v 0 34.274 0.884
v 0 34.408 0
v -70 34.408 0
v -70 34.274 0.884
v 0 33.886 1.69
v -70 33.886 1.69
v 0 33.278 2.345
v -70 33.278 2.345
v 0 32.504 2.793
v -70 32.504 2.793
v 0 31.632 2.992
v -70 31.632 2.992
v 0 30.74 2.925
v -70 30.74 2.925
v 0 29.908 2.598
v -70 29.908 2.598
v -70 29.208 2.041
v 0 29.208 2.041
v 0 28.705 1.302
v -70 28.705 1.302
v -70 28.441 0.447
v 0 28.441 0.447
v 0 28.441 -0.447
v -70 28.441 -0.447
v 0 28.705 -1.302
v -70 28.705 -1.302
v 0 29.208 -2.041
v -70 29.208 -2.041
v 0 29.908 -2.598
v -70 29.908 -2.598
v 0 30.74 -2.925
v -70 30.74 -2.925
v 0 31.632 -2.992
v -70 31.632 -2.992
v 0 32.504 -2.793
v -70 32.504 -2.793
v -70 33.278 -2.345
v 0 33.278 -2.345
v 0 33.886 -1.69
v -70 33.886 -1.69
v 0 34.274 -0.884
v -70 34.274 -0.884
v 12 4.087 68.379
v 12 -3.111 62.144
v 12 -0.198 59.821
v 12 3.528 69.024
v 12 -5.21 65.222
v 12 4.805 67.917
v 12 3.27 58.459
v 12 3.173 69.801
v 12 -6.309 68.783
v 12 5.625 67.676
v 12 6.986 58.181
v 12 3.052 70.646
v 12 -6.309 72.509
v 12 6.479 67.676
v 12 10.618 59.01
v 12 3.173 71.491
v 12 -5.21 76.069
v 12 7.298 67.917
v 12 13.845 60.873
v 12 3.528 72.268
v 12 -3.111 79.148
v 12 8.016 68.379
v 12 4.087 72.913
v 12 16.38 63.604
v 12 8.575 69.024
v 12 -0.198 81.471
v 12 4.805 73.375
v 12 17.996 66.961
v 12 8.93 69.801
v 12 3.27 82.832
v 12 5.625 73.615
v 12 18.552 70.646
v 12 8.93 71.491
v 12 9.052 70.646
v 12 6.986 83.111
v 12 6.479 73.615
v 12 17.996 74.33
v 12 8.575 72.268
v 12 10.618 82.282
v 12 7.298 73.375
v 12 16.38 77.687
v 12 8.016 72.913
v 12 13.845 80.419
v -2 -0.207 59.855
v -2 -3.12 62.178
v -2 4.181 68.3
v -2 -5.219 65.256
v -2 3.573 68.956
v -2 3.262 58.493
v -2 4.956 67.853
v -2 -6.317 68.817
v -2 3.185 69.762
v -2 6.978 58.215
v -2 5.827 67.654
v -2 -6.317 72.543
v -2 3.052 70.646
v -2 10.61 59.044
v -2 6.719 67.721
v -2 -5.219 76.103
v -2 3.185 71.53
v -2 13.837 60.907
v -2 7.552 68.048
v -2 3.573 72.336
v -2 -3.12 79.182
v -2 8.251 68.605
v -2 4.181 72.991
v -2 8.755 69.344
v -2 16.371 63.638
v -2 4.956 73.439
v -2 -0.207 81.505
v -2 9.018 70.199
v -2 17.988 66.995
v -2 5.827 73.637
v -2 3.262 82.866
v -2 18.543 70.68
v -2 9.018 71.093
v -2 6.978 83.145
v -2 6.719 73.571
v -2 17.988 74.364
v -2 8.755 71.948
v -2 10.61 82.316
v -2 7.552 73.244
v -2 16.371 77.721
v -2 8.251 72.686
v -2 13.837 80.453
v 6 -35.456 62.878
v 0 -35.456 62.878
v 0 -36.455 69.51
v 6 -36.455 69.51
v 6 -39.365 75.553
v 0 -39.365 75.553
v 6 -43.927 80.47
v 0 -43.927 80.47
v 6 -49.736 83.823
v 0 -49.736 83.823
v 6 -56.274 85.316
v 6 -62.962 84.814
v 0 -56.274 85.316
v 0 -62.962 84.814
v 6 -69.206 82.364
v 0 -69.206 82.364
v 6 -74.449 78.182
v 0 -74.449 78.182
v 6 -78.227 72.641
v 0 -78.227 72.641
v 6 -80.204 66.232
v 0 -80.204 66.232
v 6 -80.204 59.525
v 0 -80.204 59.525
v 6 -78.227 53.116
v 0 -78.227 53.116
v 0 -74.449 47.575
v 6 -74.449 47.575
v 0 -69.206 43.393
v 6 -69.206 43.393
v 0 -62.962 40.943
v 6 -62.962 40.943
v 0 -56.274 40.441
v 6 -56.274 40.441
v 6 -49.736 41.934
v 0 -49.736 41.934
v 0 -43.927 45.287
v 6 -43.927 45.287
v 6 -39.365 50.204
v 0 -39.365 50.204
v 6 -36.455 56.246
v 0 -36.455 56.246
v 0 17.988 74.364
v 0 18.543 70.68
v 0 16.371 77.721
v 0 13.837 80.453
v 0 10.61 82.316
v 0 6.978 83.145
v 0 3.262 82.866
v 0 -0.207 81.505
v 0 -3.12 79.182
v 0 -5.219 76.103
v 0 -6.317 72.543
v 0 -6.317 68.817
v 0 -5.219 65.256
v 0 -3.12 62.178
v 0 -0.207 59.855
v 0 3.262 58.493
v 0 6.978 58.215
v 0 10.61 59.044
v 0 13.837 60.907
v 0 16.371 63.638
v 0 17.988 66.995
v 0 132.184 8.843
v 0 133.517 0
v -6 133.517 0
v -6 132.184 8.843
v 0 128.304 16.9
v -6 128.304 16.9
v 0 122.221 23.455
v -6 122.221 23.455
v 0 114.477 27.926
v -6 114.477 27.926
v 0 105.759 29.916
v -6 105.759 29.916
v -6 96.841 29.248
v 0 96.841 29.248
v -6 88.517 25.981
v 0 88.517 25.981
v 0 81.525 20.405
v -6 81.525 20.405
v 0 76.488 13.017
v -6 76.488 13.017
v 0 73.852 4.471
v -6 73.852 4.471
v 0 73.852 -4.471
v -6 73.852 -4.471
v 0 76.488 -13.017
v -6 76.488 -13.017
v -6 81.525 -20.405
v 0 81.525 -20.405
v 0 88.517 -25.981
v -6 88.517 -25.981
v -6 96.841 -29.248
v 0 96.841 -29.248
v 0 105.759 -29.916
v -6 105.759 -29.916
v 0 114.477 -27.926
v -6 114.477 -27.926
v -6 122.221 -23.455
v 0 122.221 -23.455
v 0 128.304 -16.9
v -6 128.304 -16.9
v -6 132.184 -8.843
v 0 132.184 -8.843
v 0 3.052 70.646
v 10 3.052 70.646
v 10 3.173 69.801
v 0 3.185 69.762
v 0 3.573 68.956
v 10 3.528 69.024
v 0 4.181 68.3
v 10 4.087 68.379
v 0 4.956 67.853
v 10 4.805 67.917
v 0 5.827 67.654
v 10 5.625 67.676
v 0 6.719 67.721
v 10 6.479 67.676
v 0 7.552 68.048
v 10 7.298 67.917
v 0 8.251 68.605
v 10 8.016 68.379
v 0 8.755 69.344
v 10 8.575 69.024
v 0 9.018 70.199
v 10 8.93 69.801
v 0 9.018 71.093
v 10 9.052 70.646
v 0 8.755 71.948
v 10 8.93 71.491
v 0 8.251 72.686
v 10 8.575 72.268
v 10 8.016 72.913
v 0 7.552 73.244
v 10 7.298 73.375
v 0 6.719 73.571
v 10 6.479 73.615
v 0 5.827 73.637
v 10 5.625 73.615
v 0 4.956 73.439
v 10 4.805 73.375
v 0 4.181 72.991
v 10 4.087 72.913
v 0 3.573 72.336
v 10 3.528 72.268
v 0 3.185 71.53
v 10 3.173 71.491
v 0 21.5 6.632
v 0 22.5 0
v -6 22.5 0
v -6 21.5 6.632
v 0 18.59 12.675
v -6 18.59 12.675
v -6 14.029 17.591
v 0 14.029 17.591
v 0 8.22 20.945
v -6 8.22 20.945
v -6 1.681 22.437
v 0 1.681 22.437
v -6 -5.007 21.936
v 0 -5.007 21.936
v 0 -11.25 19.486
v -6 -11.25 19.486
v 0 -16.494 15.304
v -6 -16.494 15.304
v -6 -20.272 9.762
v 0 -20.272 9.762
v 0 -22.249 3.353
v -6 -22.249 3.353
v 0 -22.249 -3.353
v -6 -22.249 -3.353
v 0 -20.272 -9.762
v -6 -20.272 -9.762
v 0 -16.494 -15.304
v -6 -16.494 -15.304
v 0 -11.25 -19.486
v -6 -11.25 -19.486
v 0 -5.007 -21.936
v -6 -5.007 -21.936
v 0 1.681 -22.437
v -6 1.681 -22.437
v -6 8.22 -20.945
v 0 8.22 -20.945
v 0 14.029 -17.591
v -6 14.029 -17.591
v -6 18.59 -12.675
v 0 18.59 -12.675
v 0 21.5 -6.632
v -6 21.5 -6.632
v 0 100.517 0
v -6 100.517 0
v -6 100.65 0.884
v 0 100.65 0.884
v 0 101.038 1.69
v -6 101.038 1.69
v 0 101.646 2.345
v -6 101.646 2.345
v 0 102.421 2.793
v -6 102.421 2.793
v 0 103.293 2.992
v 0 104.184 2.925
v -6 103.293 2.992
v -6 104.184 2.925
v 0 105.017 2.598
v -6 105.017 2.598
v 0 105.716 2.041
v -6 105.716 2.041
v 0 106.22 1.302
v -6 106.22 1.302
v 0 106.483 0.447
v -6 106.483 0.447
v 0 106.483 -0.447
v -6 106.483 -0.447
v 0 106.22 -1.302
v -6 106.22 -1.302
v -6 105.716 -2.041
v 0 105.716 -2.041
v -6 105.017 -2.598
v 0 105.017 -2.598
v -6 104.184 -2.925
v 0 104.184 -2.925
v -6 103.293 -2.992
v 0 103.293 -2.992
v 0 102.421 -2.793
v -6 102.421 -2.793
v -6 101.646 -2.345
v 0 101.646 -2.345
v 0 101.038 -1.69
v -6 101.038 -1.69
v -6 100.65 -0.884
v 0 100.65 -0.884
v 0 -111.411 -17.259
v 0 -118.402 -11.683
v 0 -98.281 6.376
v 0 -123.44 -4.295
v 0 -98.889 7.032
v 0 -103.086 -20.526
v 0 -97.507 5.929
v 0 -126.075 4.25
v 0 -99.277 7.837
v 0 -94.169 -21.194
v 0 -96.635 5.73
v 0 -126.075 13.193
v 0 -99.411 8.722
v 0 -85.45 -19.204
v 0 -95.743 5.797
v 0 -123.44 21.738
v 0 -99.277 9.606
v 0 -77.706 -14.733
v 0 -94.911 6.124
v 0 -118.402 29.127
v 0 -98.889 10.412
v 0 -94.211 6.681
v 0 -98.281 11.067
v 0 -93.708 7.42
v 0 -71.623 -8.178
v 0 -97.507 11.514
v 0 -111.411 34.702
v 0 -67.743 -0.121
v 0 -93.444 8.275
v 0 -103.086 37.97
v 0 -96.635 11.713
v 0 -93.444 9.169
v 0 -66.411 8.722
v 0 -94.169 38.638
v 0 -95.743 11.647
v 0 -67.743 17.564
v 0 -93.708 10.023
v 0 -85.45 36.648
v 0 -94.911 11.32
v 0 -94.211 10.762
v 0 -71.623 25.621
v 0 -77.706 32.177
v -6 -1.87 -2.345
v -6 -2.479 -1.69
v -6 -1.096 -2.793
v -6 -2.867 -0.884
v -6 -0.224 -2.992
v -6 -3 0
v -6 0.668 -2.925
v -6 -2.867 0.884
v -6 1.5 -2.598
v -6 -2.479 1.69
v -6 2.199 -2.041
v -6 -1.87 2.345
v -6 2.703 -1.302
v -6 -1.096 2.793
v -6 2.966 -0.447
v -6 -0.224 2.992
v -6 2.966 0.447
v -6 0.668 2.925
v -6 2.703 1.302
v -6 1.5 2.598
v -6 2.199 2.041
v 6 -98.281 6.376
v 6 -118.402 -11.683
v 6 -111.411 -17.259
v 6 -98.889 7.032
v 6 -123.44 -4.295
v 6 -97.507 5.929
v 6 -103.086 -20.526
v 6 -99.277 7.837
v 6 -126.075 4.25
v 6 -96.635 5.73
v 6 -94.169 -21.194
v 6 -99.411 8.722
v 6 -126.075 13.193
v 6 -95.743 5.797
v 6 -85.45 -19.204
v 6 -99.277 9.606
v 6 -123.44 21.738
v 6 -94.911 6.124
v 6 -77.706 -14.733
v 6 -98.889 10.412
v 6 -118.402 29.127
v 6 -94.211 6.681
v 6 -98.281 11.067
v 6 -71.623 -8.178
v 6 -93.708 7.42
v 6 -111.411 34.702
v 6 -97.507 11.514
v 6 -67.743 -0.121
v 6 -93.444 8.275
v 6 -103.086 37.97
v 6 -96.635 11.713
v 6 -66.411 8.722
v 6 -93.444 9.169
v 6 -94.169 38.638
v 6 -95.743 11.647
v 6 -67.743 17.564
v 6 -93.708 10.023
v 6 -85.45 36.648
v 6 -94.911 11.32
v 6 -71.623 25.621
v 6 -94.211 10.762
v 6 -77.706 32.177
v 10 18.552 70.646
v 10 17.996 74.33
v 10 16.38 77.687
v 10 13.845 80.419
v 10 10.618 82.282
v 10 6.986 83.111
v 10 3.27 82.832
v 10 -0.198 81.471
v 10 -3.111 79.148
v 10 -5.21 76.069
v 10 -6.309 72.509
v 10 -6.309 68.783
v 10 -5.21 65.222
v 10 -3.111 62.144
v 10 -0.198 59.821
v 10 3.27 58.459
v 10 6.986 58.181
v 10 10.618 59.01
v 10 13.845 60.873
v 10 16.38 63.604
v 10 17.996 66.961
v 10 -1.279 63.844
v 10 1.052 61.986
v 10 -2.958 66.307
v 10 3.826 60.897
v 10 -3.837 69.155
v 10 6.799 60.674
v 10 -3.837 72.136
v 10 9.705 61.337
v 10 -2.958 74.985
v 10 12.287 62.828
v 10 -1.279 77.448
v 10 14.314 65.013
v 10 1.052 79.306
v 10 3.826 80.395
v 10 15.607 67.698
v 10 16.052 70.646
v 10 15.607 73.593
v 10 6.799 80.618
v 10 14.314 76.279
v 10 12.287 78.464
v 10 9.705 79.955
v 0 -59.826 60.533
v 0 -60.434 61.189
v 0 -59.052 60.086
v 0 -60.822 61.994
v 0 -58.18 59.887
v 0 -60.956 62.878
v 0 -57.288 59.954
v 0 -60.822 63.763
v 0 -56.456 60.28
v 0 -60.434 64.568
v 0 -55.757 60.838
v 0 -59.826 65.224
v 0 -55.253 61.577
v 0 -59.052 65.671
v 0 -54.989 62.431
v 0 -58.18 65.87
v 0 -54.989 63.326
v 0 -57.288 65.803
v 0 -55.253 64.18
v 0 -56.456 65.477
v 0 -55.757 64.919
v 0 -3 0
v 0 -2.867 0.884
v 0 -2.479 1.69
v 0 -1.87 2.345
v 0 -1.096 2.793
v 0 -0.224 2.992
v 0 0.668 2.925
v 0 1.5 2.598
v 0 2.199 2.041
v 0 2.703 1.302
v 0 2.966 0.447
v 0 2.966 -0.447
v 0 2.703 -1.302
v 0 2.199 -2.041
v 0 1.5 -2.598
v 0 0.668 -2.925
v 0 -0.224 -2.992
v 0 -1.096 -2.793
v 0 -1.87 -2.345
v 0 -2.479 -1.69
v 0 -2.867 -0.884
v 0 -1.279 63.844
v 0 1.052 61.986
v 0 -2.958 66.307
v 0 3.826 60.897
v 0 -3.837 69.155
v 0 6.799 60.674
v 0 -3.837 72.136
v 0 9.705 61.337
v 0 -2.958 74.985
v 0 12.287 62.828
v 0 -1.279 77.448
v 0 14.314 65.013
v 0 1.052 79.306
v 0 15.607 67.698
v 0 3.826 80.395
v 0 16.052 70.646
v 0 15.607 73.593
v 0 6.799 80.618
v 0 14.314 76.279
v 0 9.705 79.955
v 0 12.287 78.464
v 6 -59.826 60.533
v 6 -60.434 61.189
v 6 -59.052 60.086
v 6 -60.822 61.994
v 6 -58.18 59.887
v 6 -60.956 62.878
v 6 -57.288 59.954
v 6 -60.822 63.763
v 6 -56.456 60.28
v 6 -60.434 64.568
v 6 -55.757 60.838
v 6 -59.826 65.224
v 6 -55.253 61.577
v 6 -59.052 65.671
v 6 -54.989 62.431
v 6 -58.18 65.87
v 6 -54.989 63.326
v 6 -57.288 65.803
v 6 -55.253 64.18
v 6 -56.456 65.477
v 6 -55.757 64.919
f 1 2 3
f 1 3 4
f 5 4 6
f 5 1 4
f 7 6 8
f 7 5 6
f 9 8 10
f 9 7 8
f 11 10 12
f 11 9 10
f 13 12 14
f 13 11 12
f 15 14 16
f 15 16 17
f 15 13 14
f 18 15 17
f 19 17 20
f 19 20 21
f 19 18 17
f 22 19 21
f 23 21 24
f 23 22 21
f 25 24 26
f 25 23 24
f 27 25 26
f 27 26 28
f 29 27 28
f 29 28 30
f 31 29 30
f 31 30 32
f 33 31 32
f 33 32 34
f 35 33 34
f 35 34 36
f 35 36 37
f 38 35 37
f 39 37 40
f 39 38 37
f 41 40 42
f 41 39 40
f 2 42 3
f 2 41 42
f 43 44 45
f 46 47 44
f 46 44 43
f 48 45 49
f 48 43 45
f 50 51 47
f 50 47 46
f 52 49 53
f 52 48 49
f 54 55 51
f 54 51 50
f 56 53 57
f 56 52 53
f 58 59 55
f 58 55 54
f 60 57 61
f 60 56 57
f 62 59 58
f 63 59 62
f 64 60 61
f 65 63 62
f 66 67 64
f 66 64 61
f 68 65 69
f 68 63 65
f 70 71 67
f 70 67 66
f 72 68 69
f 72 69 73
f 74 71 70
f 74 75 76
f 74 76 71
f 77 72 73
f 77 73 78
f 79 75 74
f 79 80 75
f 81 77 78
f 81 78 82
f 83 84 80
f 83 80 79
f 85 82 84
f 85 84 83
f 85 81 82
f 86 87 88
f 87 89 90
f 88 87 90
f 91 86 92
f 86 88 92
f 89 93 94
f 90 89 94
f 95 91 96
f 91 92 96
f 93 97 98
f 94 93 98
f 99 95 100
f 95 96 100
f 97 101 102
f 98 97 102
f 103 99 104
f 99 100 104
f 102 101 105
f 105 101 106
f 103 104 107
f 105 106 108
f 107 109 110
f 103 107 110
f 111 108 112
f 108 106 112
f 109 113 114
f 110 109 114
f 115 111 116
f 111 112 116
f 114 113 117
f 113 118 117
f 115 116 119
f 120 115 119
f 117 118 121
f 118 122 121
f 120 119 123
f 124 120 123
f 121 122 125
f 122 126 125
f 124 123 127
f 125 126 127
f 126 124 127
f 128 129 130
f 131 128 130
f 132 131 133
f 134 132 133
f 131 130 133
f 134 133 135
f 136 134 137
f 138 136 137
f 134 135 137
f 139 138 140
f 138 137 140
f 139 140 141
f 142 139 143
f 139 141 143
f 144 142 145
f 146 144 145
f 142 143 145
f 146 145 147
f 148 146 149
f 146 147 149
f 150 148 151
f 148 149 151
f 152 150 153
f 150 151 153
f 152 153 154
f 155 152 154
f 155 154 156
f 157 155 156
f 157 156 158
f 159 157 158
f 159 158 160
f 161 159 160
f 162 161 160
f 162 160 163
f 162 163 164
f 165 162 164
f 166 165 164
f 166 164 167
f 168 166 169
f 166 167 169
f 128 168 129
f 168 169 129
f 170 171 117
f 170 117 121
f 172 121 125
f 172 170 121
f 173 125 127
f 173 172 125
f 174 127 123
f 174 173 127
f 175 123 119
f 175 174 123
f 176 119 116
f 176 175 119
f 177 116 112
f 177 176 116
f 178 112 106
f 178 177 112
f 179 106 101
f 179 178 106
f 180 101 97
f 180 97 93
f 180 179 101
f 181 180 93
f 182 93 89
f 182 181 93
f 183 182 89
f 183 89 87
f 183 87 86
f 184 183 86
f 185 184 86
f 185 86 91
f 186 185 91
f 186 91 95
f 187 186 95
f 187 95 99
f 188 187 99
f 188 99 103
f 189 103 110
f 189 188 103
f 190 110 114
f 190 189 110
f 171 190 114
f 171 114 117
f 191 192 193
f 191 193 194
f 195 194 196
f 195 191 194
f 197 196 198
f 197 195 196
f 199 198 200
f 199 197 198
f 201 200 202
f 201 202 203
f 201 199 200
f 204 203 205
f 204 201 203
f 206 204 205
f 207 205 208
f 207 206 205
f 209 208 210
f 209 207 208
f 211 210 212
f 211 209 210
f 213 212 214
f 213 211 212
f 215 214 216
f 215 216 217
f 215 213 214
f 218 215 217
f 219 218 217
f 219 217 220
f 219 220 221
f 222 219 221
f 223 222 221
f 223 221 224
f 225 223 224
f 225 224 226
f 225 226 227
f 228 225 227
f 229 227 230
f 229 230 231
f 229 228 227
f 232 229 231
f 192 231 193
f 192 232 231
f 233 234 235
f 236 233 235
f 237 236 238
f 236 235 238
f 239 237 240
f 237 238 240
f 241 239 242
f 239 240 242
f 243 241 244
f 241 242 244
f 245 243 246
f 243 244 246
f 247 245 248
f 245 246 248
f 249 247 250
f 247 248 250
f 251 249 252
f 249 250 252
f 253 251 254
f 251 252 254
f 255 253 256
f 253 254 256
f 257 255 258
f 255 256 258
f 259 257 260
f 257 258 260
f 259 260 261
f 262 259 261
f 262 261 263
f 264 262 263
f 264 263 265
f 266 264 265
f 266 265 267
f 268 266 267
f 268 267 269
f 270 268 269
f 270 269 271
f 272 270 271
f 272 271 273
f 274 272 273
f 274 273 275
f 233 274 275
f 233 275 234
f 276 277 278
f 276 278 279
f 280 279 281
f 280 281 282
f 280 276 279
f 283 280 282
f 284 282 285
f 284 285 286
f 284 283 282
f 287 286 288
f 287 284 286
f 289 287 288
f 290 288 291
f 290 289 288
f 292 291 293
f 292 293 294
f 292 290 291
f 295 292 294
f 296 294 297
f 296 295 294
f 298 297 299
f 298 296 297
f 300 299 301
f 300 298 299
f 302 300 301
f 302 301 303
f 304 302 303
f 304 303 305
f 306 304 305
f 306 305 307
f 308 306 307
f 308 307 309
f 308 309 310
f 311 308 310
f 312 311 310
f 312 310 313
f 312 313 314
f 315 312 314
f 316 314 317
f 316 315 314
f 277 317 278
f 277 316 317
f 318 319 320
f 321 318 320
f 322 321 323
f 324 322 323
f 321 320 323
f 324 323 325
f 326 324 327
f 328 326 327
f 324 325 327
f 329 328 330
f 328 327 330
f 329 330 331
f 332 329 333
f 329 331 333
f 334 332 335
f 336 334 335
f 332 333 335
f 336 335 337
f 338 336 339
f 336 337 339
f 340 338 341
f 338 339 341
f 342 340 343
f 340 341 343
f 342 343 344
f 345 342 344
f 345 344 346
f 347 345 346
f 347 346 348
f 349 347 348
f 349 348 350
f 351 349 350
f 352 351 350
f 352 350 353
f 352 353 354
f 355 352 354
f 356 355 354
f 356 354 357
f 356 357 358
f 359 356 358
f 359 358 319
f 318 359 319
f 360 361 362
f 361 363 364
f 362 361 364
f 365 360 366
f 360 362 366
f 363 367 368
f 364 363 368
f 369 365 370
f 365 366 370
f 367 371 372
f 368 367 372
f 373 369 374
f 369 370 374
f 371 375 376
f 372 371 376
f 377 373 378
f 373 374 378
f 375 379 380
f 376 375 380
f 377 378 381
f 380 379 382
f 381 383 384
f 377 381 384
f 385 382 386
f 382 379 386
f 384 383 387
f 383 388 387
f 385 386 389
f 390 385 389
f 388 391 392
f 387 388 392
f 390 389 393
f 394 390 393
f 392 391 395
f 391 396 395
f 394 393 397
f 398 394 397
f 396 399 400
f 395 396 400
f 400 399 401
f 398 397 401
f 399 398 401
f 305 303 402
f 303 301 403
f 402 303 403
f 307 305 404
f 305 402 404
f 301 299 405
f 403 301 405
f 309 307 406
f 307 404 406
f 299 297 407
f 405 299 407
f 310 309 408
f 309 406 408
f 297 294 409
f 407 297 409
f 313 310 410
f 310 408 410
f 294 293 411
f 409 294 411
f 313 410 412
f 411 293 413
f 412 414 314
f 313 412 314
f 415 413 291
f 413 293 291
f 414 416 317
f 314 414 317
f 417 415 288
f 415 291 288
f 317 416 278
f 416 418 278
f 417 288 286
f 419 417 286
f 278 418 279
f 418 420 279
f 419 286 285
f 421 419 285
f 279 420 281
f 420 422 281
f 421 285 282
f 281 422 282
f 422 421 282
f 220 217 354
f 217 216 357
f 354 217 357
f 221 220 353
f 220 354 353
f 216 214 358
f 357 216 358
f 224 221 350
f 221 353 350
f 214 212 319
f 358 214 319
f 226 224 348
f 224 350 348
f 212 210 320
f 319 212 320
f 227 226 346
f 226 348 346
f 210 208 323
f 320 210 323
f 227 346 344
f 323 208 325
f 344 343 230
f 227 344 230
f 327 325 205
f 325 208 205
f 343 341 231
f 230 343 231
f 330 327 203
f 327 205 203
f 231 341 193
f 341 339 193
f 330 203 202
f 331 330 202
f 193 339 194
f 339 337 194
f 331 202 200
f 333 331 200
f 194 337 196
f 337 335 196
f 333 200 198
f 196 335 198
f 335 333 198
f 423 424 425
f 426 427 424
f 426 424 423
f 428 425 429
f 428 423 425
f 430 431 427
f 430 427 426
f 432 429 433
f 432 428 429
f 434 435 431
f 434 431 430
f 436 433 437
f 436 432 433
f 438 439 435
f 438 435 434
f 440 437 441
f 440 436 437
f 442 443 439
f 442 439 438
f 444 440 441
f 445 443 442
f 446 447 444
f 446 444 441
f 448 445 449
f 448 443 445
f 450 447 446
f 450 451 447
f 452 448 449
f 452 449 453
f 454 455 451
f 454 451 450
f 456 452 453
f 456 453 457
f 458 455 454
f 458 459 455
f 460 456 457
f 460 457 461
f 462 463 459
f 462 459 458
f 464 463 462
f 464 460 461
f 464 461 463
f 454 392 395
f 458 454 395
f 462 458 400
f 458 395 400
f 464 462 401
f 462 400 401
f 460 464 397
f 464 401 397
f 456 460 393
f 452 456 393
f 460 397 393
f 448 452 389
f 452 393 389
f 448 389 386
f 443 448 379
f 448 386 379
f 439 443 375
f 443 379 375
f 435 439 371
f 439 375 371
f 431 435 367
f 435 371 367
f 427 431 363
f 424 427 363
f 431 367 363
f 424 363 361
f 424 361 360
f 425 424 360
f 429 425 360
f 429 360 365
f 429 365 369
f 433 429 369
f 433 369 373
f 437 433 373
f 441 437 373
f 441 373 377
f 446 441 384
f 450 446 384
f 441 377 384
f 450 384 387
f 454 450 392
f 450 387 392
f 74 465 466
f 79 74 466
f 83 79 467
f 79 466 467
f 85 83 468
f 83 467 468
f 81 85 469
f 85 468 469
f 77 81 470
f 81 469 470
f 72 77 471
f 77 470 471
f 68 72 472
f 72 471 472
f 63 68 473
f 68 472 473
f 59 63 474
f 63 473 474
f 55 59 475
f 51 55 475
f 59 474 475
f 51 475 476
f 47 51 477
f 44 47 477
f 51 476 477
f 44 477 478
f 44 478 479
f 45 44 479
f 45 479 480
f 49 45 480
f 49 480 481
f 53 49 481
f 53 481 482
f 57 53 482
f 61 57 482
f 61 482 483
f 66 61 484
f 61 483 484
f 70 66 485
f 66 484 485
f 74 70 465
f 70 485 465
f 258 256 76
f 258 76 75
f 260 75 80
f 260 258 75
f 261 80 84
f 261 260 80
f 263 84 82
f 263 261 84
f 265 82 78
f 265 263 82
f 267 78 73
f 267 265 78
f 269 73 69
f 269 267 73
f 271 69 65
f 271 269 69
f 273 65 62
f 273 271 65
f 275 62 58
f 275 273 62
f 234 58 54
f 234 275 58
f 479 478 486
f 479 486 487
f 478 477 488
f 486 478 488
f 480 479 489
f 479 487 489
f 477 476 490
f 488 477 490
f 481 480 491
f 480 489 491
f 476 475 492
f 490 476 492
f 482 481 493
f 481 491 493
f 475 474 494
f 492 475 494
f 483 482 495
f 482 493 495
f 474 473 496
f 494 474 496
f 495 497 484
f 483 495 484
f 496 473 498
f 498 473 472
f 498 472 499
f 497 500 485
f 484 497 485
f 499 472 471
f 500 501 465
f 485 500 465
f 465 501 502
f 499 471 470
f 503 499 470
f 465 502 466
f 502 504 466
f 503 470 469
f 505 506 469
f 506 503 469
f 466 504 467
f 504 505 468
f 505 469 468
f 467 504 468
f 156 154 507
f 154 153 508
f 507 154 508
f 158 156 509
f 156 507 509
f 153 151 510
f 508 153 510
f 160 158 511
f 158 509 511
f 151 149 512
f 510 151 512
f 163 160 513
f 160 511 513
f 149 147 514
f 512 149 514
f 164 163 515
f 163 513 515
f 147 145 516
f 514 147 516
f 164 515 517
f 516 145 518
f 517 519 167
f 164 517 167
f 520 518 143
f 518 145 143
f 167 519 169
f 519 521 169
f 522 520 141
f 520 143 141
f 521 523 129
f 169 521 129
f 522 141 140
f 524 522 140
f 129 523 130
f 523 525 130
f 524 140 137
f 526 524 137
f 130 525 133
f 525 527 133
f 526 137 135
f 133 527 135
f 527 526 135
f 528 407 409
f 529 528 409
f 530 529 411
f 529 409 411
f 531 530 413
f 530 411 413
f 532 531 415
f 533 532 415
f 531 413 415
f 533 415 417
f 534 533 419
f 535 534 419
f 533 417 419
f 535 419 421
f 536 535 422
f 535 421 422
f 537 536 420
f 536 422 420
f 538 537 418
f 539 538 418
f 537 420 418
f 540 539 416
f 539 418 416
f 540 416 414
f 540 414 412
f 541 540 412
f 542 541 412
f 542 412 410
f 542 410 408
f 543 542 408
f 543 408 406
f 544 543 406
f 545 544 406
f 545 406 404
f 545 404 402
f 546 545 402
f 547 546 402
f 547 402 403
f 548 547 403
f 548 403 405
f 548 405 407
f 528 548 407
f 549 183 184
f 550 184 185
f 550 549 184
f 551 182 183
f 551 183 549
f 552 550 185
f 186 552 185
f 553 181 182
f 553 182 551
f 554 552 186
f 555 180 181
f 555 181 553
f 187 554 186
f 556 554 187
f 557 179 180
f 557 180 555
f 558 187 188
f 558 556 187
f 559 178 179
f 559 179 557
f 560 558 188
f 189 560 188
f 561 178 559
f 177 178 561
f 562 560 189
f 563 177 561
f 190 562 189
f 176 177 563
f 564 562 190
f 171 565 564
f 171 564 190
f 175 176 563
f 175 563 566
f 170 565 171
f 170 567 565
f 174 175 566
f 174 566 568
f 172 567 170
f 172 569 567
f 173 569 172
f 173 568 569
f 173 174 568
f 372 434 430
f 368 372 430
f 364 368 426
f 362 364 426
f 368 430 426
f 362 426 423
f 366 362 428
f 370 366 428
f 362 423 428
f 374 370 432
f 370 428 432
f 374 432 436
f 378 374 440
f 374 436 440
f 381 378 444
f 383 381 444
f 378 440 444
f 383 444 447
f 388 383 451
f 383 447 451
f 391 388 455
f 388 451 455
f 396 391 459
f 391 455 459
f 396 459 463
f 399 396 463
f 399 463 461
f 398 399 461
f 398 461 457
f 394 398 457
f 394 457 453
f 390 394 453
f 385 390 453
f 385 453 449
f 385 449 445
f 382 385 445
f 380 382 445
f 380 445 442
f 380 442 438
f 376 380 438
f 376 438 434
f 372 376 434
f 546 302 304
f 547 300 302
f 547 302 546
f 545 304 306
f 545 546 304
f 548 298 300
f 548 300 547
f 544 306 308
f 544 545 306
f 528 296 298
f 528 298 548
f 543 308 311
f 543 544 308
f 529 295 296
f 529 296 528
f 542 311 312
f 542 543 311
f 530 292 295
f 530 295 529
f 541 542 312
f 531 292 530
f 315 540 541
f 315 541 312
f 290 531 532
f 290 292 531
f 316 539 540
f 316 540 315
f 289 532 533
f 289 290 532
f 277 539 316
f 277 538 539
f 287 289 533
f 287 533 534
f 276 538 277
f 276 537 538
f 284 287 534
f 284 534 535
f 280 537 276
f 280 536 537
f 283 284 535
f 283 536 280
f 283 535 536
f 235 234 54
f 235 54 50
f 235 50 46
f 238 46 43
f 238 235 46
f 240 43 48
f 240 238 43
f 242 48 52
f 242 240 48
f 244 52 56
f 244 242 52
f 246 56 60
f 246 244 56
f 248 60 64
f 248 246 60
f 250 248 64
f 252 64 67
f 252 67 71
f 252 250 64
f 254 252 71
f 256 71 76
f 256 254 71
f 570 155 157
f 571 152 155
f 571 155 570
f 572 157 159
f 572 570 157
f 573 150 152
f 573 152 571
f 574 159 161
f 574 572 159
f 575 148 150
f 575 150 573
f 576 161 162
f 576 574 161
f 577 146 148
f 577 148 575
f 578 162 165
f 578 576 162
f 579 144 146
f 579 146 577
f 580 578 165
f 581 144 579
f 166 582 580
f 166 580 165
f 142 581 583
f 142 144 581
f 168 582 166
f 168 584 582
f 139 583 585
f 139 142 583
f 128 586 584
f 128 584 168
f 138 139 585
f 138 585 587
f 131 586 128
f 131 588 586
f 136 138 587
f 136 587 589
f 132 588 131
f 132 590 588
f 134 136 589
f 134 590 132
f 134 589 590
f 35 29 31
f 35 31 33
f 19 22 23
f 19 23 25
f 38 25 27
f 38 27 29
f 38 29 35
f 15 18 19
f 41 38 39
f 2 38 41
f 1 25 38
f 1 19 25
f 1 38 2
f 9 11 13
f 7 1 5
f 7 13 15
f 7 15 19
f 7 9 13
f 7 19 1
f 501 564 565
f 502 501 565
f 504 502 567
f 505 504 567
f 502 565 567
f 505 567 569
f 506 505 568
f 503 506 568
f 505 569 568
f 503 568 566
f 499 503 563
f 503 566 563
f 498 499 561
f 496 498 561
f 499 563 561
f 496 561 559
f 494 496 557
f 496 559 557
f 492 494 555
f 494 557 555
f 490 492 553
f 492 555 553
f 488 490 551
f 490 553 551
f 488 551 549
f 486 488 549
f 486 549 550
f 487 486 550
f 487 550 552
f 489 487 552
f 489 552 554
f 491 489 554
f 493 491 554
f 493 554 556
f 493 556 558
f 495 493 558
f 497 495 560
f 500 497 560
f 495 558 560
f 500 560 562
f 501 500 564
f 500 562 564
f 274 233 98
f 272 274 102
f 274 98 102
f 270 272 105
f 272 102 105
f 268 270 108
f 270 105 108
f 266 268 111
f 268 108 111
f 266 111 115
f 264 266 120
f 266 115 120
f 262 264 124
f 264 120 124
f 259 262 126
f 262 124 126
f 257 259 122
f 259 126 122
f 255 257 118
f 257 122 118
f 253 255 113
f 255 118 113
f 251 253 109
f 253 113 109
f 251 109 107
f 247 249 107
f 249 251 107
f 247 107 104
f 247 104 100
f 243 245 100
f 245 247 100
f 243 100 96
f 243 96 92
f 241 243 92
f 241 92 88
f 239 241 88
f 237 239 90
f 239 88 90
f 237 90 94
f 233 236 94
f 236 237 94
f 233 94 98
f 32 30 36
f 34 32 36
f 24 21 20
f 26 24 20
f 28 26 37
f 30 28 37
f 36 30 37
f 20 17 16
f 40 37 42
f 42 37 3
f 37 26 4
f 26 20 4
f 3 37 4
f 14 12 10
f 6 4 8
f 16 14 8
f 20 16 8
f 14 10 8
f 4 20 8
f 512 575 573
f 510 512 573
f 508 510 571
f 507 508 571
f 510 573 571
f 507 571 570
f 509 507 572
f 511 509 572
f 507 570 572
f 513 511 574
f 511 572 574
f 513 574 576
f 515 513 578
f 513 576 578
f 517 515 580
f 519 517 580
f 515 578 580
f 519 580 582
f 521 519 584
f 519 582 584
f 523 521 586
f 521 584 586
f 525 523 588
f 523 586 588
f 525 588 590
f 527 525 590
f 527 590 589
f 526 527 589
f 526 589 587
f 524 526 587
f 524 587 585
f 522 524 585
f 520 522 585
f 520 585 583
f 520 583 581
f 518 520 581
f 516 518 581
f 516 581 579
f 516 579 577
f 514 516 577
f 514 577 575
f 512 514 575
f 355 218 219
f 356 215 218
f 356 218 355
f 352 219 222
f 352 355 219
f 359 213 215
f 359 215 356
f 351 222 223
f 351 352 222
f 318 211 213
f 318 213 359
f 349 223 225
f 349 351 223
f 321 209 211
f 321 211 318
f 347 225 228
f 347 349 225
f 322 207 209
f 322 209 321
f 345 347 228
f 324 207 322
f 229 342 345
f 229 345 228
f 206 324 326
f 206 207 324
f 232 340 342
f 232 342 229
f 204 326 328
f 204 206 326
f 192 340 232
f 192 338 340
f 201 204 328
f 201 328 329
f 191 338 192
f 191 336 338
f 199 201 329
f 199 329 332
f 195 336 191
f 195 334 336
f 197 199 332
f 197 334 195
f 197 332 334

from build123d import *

# Parameters (mm, degrees)
F0_R      = 22.5
F1_DEPTH  = 6
F2_D      = 6
F3_R      = 30
F4_DEPTH  = 6
F5_D      = 6
F6_R      = 3
F7_DEPTH  = 70
F8_R      = 30
F9_DEPTH  = 6
F10_D     = 6
F11_R     = 22.5
F12_DEPTH = 6
F13_D     = 6
F14_R     = 10
F15_DEPTH = 10
F16_D     = 6
F17_R     = 12.5
F17_R_2   = 10
F17_R_3   = 3
F18_DEPTH = 2
F19_R     = 12.5
F19_R_2   = 10
F20_DEPTH = 2
F21_D     = 6


with BuildPart() as f1:
    # F0 (on Right) → F1 (new body)
    with BuildSketch(Plane.YZ):
        Circle(F0_R)
    extrude(amount=-F1_DEPTH)

    # F2 (through all)
    with Locations(Plane.YZ):
        with Locations((0, 0)):
            Hole(F2_D / 2)


with BuildPart() as f4:
    # F3 (on Right) → F4 (new body)
    with BuildSketch(Plane.YZ):
        with Locations((103.5167500303, 0)):
            Circle(F3_R)
    extrude(amount=-F4_DEPTH)

    # F5 (through all)
    with Locations(Plane.YZ):
        with Locations((103.5167500303, 0)):
            Hole(F5_D / 2)


with BuildPart() as f7:
    # F6 (on Right) → F7 (new body)
    with BuildSketch(Plane.YZ):
        with Locations((31.4075189506, 0)):
            Circle(F6_R)
    extrude(amount=-F7_DEPTH)


with BuildPart() as f9:
    # F8 (on Right) → F9 (new body)
    with BuildSketch(Plane.YZ):
        with Locations((-96.4105576277, 8.7217288092)):
            Circle(F8_R)
    extrude(amount=F9_DEPTH)

    # F10 (through all)
    with Locations(Plane(origin=(0, 0, 0), x_dir=(0, 1, 0), z_dir=(-1, 0, 0))):
        with Locations((-96.4105576277, -8.7217288092)):
            Hole(F10_D / 2)


with BuildPart() as f12:
    # F11 (on Right) → F12 (new body)
    with BuildSketch(Plane.YZ):
        with Locations((-57.9556971788, 62.8784671426)):
            Circle(F11_R)
    extrude(amount=F12_DEPTH)

    # F13 (through all)
    with Locations(Plane(origin=(0, 0, 0), x_dir=(0, 1, 0), z_dir=(-1, 0, 0))):
        with Locations((-57.9556971788, -62.8784671426)):
            Hole(F13_D / 2)


with BuildPart() as f15:
    # F14 (on Right) → F15 (new body)
    with BuildSketch(Plane.YZ):
        with Locations((6.0516879894, 70.6458836794)):
            Circle(F14_R)
    extrude(amount=F15_DEPTH)

    # F16 (through all)
    with Locations(Plane(origin=(0, 0, 0), x_dir=(0, 1, 0), z_dir=(-1, 0, 0))):
        with Locations((6.0516879894, -70.6458836794)):
            Hole(F16_D / 2)



with BuildPart() as f18:
    # F17 (on face) → F18 (new body)
    with BuildSketch(Plane.YZ.offset(10)):
        with Locations((6.0516879894, 70.6458836794)):
            Circle(F17_R)
        with Locations((6.0516879894, 70.6458836794)):
            Circle(F17_R_2, mode=Mode.SUBTRACT)
        with Locations((6.0516879894, 70.6458836794)):
            Circle(F17_R_2)
        with Locations((6.0516879894, 70.6458836794)):
            Circle(F17_R_3, mode=Mode.SUBTRACT)
    extrude(amount=F18_DEPTH)


with BuildPart() as f15_1:
    add(f15.part)

    add(f18.part)  # F20 merges F18
    # F19 (on face) + F14 (on Right) → F20 (join)
    with BuildSketch(Plane.YZ):
        with Locations((6.0434634797, 70.6798732281)):
            Circle(F19_R)
        with Locations((6.0516879894, 70.6458836794)):
            Circle(F19_R_2, mode=Mode.SUBTRACT)
    with BuildSketch(Plane.YZ):
        with Locations((6.0516879894, 70.6458836794)):
            Circle(F14_R)
    extrude(amount=-F20_DEPTH)

    # F21 (through all)
    with Locations(Plane.YZ):
        with Locations((6.0516879894, 70.6458836794)):
            Hole(F21_D / 2)


solid = Compound([f1.part, f4.part, f7.part, f9.part, f12.part, f15_1.part])
